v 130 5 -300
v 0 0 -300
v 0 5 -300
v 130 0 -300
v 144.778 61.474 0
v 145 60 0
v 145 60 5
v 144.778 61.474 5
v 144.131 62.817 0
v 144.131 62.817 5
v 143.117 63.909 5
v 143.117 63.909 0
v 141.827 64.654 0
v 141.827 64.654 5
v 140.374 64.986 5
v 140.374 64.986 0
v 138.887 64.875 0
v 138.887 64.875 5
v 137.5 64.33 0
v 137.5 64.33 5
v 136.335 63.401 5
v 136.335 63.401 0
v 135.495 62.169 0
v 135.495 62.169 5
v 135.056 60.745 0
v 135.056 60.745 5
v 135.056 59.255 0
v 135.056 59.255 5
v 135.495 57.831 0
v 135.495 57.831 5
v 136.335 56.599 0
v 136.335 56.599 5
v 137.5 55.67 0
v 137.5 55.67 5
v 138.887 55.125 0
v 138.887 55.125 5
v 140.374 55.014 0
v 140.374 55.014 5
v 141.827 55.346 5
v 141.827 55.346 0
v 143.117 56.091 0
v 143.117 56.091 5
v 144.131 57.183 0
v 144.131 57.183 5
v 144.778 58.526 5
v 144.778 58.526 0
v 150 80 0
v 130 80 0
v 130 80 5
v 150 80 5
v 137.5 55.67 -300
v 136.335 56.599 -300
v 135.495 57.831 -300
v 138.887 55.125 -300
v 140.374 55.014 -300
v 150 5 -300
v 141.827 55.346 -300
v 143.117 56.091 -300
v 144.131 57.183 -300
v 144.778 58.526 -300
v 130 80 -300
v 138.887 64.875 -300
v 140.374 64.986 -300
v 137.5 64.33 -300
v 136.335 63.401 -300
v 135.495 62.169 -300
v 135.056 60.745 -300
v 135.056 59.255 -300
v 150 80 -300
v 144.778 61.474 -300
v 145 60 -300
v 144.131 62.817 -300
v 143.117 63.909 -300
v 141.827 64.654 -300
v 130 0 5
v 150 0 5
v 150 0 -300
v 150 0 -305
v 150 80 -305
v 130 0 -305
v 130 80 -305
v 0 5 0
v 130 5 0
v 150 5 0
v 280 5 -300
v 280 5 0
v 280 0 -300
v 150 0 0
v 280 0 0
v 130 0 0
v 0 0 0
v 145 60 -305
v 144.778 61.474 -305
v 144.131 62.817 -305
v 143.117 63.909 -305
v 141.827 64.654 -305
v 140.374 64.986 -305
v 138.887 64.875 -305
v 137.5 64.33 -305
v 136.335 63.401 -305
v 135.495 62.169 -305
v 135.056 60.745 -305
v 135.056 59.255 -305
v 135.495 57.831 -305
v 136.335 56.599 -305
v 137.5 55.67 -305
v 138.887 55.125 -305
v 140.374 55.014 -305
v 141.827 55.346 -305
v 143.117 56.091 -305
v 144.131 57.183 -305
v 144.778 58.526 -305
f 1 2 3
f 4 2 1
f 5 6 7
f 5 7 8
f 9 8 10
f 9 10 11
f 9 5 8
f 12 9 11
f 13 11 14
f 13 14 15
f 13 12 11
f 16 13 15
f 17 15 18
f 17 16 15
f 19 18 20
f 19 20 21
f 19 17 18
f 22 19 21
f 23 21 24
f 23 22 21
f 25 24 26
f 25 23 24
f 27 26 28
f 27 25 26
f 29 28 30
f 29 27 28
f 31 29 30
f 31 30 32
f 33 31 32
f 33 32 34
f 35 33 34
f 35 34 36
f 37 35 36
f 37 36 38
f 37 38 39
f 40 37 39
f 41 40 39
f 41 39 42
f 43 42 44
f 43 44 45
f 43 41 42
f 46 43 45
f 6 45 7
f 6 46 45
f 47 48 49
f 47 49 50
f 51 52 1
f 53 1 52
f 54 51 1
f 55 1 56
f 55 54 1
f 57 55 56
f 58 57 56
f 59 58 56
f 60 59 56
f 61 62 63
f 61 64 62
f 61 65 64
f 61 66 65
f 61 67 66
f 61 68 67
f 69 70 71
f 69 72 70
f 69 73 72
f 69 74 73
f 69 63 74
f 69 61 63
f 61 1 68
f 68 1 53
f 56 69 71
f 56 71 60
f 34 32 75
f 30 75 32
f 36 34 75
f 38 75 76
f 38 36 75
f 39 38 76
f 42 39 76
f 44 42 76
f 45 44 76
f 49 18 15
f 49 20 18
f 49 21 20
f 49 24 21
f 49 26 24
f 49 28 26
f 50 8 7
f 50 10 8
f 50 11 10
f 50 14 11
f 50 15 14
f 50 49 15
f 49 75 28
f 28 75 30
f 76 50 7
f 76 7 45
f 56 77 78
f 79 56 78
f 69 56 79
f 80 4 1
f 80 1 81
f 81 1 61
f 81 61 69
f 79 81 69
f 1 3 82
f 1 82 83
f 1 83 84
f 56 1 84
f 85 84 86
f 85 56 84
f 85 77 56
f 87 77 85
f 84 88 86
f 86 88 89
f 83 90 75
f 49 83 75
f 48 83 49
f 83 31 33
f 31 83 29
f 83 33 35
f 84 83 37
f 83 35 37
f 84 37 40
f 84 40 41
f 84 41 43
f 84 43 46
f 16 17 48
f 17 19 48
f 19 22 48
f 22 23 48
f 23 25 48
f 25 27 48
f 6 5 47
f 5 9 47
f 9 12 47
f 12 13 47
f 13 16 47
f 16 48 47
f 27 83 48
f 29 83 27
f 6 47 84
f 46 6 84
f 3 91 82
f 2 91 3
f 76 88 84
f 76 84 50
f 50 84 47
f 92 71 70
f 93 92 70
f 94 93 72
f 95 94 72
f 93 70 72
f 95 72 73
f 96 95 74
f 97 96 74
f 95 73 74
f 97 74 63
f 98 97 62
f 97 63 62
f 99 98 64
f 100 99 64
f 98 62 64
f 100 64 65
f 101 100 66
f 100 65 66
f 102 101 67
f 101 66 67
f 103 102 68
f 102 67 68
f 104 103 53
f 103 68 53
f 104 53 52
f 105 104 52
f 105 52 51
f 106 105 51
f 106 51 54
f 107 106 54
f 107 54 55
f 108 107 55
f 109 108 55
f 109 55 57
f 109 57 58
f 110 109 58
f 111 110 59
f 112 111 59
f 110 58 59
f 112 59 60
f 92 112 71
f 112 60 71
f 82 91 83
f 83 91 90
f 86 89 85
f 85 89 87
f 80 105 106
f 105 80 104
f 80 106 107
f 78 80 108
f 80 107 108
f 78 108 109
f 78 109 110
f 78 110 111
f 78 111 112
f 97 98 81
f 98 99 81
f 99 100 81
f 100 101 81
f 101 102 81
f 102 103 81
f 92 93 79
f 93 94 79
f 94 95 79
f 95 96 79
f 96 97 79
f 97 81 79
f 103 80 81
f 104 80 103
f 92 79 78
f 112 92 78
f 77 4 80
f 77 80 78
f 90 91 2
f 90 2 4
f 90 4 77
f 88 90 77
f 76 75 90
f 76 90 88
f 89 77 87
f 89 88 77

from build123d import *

# Parameters (mm, degrees)
SKETCH1_W           = 280
SKETCH1_H           = 300
BOSS_EXTRUDE1_DEPTH = 5
SKETCH2_W           = 20
SKETCH2_H           = 80
SKETCH2_R           = 5
BOSS_EXTRUDE2_DEPTH = 5


with BuildPart() as part:
    # Sketch1 → Boss-Extrude1 (new body)
    with BuildSketch(Plane(origin=(0, 0, 0), x_dir=(1, 0, 0), z_dir=(0, 1, 0))):
        with Locations((140, 150)):
            Rectangle(SKETCH1_W, SKETCH1_H)
    extrude(amount=BOSS_EXTRUDE1_DEPTH)

    # Sketch2 → Boss-Extrude2 (add)
    with BuildSketch(Plane.XY):
        with Locations((140, 40)):
            Rectangle(SKETCH2_W, SKETCH2_H)
        with Locations((140, 60)):
            Circle(SKETCH2_R, mode=Mode.SUBTRACT)
    boss_extrude2 = extrude(amount=BOSS_EXTRUDE2_DEPTH)

    # Mirror1: Boss-Extrude2 across plane
    add(boss_extrude2.mirror(Plane.XY.offset(-150)))


solid = part.part
